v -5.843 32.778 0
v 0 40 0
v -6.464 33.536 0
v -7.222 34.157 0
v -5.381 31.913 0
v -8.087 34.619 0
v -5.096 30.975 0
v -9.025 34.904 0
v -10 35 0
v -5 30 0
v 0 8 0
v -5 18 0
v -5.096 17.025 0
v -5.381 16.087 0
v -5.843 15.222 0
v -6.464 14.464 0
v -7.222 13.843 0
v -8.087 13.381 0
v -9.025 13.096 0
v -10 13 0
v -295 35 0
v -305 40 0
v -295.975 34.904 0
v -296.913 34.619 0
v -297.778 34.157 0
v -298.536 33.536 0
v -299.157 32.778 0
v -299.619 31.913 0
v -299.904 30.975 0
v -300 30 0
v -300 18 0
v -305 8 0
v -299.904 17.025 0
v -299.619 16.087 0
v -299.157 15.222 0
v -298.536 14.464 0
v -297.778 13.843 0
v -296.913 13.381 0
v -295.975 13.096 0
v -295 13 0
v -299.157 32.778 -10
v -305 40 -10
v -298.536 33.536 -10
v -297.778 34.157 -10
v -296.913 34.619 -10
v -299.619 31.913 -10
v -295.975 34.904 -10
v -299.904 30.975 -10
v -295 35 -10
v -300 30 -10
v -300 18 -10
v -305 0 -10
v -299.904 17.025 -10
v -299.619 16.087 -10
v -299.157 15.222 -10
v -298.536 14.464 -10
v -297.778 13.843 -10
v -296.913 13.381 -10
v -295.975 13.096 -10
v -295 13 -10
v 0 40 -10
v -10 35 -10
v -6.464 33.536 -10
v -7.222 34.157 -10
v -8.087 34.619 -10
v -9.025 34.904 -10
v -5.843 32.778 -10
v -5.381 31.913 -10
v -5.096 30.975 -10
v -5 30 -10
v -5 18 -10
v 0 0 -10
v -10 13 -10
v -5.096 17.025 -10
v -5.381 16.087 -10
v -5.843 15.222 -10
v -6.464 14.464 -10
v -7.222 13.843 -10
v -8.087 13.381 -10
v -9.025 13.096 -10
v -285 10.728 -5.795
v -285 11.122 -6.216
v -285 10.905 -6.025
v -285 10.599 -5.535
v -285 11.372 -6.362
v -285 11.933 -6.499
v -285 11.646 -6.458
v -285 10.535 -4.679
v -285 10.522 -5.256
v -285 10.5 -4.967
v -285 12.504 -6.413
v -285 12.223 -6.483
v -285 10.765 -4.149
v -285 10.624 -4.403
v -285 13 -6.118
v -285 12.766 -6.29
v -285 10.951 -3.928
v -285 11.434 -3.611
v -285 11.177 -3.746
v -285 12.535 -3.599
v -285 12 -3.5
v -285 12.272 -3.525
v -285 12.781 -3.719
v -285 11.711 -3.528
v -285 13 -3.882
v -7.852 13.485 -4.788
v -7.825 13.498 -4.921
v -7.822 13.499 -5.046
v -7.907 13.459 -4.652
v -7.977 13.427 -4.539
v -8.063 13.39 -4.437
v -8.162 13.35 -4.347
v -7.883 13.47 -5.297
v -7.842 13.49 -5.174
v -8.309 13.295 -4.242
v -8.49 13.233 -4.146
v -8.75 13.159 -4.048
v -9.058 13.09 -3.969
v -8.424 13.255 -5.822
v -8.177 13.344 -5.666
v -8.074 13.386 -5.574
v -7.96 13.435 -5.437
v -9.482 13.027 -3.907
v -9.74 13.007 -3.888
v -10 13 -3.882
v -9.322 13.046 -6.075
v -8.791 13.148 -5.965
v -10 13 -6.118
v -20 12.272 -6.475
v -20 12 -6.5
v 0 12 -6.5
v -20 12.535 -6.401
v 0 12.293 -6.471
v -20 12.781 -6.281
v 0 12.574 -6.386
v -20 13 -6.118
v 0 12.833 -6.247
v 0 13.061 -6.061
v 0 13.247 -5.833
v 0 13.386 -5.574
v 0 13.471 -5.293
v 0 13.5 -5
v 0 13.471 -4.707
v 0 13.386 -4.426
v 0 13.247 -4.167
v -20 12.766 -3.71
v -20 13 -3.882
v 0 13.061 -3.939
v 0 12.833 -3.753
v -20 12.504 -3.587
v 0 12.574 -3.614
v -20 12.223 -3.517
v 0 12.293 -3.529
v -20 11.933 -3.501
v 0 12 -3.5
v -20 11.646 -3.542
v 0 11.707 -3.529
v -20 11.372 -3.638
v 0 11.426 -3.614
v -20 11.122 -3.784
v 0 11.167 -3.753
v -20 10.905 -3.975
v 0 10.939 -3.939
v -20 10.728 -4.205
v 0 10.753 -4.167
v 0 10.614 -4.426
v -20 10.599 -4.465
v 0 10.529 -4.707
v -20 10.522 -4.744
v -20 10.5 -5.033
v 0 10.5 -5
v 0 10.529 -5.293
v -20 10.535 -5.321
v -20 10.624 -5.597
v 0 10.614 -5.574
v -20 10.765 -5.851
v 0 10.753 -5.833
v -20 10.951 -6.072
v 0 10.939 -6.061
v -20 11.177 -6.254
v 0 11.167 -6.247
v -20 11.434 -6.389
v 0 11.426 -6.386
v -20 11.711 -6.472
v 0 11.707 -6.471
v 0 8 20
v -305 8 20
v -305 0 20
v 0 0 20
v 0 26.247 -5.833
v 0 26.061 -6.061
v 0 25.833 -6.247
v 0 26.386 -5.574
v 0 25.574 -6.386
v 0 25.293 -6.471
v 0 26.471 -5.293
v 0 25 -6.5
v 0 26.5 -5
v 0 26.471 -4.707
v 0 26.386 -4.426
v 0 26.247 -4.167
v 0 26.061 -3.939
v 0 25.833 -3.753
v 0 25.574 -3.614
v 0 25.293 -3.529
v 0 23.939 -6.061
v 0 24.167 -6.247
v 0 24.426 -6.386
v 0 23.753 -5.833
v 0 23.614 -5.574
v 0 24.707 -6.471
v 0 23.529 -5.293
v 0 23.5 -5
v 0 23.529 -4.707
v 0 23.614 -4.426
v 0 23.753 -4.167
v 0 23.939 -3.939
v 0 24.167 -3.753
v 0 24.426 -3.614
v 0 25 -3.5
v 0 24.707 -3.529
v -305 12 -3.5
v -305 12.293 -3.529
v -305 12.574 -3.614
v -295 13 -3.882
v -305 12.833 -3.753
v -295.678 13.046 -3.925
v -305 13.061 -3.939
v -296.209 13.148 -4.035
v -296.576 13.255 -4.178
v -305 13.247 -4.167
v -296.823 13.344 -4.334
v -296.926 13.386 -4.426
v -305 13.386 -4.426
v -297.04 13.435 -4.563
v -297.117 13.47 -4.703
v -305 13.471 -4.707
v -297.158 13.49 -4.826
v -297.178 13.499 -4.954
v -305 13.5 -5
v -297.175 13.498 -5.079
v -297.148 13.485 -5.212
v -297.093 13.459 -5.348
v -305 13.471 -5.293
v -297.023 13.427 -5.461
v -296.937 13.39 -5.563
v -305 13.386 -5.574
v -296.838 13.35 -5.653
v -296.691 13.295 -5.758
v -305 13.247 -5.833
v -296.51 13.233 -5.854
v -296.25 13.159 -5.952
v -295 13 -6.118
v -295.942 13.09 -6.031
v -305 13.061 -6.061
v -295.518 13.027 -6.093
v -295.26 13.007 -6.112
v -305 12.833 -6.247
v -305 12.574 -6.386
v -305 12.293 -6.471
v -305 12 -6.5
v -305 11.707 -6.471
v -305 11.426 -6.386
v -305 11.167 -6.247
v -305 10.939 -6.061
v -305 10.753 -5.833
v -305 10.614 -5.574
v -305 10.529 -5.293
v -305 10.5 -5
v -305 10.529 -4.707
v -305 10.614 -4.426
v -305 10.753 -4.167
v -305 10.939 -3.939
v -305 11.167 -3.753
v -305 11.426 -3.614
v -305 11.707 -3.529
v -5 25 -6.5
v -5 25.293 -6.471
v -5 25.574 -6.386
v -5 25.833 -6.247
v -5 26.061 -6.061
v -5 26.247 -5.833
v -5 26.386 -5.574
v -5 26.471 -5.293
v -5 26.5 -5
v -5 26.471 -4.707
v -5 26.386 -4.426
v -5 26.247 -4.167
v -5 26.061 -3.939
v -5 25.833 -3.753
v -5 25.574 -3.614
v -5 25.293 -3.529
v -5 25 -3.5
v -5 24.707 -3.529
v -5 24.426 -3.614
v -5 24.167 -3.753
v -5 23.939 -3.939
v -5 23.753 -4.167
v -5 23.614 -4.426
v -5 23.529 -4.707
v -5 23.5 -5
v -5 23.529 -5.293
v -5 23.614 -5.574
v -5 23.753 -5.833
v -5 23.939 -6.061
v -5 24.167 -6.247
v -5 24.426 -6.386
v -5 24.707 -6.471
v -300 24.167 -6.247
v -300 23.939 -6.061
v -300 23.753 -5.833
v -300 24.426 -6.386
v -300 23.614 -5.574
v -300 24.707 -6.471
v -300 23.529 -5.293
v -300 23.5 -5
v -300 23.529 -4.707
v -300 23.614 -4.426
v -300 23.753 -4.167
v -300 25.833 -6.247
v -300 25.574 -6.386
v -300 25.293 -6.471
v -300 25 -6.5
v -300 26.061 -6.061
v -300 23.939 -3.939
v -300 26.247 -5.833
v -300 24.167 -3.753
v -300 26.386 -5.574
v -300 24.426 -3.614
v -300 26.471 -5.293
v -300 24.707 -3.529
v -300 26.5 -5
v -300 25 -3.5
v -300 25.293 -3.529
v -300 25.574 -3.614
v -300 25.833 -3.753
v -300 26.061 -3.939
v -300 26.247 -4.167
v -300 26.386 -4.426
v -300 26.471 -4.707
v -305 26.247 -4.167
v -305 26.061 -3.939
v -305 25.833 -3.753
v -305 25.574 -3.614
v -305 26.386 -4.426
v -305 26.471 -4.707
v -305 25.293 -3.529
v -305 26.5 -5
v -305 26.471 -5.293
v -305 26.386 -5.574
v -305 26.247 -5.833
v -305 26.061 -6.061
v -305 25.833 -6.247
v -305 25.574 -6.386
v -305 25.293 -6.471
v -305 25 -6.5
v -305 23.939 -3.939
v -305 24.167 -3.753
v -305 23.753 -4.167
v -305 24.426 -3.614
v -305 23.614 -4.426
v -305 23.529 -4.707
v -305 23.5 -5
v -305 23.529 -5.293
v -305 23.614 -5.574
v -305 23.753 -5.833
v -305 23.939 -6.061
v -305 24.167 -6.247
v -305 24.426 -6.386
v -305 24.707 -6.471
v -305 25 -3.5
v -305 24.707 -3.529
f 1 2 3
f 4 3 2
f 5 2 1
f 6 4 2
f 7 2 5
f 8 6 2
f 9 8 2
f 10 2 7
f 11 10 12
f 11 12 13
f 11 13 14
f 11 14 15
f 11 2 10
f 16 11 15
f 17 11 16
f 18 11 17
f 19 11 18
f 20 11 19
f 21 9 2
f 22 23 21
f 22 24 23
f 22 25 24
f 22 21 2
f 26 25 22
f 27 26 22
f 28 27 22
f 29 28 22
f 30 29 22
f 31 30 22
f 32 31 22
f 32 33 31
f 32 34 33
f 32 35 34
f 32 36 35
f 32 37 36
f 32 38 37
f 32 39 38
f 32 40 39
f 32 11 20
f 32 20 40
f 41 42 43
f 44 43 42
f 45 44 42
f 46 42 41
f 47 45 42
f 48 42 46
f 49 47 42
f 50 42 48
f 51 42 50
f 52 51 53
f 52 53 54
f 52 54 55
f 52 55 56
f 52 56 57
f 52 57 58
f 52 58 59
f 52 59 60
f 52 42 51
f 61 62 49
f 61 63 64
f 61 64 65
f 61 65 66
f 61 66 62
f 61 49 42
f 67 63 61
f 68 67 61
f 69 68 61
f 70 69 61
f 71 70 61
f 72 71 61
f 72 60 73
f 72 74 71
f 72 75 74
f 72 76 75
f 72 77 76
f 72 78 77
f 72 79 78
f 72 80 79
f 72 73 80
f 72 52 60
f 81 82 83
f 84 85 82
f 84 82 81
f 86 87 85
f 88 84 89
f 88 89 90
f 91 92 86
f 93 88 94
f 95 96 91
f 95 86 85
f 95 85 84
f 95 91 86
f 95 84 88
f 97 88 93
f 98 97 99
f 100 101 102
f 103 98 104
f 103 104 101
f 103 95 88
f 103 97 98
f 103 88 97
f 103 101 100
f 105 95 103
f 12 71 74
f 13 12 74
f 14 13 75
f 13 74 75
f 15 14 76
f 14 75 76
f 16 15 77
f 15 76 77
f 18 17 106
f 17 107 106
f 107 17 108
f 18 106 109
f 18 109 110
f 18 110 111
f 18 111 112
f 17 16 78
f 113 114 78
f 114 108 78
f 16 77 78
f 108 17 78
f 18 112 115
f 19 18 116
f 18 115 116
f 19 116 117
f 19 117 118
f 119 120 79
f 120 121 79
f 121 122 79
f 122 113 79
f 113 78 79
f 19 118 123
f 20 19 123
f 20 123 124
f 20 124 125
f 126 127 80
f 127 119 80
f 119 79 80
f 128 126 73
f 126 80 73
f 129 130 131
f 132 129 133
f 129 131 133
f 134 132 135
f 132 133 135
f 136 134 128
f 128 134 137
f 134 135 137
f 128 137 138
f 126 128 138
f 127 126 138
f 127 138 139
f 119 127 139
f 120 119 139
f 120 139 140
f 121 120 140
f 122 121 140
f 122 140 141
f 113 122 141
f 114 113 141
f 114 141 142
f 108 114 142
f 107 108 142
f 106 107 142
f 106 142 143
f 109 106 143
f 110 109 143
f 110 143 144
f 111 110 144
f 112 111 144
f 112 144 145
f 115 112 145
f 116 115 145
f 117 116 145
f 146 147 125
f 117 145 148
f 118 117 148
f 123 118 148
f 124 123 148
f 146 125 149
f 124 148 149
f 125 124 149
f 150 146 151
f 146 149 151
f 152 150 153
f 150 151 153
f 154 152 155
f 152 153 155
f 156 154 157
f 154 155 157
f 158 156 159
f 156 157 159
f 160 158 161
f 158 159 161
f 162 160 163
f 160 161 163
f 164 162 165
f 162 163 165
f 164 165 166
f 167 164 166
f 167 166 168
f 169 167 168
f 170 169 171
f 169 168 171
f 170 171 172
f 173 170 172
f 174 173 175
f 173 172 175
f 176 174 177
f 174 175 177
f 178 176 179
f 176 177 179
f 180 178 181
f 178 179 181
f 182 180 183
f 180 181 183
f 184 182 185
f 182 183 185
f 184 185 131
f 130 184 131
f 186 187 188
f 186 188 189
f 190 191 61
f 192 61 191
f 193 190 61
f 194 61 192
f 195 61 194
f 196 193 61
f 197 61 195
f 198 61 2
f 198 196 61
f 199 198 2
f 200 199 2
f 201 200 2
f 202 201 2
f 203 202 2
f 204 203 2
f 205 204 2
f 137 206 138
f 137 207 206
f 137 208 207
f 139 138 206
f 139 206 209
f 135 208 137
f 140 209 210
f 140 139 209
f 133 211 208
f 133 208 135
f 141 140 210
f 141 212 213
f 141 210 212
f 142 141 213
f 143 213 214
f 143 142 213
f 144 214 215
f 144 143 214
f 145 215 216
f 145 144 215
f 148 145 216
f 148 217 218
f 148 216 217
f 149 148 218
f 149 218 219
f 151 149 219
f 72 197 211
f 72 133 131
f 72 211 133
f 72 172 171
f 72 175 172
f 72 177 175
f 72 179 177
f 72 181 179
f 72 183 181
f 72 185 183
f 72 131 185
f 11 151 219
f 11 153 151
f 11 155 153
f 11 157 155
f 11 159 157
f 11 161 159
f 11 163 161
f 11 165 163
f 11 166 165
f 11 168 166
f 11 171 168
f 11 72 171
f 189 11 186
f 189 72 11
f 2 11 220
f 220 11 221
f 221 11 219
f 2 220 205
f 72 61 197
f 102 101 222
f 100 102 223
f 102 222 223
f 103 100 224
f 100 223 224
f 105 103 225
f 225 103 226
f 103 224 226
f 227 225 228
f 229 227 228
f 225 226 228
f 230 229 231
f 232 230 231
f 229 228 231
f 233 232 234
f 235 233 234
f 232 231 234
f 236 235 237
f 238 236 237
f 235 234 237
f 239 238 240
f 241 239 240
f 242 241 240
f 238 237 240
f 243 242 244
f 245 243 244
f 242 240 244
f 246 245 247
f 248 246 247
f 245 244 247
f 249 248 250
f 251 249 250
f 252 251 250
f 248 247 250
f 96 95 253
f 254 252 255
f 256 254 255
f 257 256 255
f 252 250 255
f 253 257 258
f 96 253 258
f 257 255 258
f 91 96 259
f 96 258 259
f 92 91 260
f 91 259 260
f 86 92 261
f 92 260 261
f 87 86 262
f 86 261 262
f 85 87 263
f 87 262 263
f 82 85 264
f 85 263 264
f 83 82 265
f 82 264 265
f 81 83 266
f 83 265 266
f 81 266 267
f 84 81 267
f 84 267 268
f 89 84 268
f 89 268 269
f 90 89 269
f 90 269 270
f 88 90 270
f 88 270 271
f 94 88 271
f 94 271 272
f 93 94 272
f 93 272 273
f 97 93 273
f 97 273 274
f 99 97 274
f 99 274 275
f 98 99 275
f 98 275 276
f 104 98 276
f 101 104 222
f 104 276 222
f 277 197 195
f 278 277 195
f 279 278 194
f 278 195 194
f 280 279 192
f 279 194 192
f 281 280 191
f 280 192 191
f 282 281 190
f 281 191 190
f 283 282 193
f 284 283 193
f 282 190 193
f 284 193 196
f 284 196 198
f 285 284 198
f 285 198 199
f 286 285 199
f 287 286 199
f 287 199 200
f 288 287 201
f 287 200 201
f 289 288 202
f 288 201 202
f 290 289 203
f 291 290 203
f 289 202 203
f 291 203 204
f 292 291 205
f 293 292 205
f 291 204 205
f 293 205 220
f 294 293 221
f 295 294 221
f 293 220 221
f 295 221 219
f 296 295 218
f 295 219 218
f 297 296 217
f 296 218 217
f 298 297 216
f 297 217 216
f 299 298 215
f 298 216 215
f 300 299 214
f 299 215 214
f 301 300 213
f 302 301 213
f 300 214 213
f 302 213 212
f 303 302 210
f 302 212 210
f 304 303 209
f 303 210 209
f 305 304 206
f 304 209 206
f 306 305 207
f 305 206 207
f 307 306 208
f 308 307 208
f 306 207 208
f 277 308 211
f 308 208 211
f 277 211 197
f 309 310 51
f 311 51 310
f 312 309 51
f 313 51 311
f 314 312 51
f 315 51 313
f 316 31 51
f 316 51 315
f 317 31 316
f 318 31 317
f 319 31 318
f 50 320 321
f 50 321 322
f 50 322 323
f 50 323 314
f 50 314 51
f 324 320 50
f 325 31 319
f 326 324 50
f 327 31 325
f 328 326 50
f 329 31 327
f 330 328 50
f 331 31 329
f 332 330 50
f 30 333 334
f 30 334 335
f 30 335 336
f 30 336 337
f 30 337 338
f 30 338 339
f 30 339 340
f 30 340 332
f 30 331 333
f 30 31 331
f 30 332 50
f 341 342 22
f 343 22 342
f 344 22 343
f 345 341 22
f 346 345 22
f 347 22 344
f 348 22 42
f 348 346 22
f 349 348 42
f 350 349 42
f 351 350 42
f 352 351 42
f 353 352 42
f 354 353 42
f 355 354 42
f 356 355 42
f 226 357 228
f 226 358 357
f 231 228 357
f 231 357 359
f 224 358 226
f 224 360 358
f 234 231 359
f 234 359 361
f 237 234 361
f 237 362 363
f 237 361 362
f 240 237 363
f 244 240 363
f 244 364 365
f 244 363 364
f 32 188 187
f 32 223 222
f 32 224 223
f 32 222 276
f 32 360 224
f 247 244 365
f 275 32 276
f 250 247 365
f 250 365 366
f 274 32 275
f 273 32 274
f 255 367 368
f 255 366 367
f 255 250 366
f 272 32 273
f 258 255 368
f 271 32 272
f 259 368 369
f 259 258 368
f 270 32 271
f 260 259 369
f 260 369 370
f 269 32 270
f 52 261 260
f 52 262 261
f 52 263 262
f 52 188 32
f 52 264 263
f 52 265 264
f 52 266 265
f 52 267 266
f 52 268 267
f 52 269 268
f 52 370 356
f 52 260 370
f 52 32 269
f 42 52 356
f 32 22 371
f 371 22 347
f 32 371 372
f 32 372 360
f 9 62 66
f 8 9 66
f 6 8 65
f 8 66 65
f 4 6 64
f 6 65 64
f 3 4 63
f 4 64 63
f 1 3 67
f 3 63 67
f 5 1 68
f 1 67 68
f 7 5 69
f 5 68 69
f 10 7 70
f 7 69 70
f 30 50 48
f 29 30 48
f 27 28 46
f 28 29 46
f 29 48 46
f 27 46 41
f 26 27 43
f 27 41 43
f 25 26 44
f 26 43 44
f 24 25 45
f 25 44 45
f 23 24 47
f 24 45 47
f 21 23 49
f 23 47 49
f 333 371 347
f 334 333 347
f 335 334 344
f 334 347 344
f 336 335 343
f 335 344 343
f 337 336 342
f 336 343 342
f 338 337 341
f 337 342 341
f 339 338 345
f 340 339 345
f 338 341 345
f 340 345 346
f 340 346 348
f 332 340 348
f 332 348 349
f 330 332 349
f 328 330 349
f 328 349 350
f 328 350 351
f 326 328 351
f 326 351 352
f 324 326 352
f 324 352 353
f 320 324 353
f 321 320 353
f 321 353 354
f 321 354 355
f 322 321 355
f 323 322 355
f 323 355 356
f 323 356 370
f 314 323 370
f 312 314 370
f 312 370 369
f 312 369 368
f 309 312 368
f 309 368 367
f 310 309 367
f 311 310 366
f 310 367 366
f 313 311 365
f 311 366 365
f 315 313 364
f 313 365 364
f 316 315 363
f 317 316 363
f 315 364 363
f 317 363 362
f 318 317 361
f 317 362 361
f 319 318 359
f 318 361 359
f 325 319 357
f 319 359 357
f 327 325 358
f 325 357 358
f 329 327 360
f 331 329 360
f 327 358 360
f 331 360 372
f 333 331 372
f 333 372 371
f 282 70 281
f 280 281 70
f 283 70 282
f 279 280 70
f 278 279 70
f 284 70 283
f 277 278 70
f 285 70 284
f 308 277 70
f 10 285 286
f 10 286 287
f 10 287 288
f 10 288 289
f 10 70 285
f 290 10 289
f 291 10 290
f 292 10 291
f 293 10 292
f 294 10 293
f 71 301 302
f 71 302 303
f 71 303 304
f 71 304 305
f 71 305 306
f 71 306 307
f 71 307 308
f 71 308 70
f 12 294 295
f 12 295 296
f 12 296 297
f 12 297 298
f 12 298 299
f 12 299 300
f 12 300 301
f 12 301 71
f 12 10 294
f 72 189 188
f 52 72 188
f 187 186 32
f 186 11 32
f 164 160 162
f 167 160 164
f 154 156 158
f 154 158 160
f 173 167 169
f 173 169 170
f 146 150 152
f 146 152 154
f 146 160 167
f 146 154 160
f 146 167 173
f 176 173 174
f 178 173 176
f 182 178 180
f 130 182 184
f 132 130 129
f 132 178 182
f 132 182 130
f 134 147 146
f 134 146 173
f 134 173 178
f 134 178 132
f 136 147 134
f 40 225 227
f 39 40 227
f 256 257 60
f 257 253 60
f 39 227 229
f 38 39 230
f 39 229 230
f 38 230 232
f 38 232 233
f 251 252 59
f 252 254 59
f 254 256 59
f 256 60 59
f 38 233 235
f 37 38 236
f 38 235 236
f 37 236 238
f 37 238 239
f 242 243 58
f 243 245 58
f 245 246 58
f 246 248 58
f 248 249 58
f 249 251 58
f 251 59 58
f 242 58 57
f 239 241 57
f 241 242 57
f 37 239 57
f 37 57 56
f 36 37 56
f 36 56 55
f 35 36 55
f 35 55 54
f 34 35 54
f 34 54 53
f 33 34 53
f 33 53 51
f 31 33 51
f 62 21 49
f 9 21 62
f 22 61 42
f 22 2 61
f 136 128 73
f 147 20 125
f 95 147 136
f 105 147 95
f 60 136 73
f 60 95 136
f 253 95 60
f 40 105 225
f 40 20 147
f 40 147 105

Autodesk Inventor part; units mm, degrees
ref_plane "YZ Plane" through (0, 0, 0) normal (1, 0, 0) x (0, 1, 0)
ref_plane "XZ Plane" through (0, 0, 0) normal (0, 1, 0) x (-1, 0, 0)
ref_plane "XY Plane" through (0, 0, 0) normal (0, 0, 1) x (1, 0, 0)
sketch "Sketch1" plane through (0, 0, 0) normal (0, 1, 0) x (-1, 0, 0)
  line L0 (0, 0) -> (305, 0)
  line L1 (305, 0) -> (305, -10)
  line L2 (305, -10) -> (0, -10)
  line L3 (0, -10) -> (0, 0)
  dimension "d0" = 305
  dimension "d1" = 10
extrude "Extrusion1" add sketch "Sketch1" along normal blind 40
sketch "Sketch2" plane through (-305, 0, 0) normal (0, 0, 1) x (1, 0, 0)
  line L0 (305, 0) -> (0, 0) projected
  line L1 (305, 0) -> (305, 40) projected
  line L2 (0, 0) -> (305, 0)
  line L3 (305, 0) -> (305, 8)
  line L4 (305, 8) -> (0, 8)
  line L5 (0, 8) -> (0, 0)
  dimension "d4" = 8
extrude "Extrusion2" add sketch "Sketch2" along normal blind 20
sketch "Sketch3" plane through (-305, 40, 0) normal (0, 0, 1) x (1, 0, 0)
  line L0 (305, -27) -> (0, -27) projected
  line L1 (5, -5) -> (300, -5)
  line L2 (300, -5) -> (300, -27)
  line L3 (300, -27) -> (5, -27)
  line L4 (5, -27) -> (5, -5)
  line L5 (0, -32) -> (0, 0) projected
  line L6 (0, 0) -> (305, 0) projected
  line L7 (305, -32) -> (305, 0) projected
  point P0 (305, -40)
  point P1 (305, -16)
  dimension "d8" = 5
  dimension "d9" = 5
  dimension "d10" = 5
extrude "Extrusion3" cut sketch "Sketch3" against normal blind 20 contours L0 L4 L1 L2
fillet "Fillet2" radius 5 4 edges at (-300, 13, -5) (-300, 35, -5) (-5, 13, -5) (-5, 35, -5)
sketch "Sketch4" plane through (-305, 0, -10) normal (-1, 0, 0) x (0, 0, 1)
  circle A0 centre (5, 25) radius 1.5
  circle A1 centre (5, 12) radius 1.5
  line L0 (0, 40) -> (10, 40) projected
  line L1 (0, 0) -> (0, 40) projected
  point P0 (10, 0)
  dimension "d14" = 3
  dimension "d15" = 3
  dimension "d16" = 15
  dimension "d17" = 10
  dimension "d18" = 5
  dimension "d19" = 5
extrude "Extrusion4" cut sketch "Sketch4" against normal blind 20
sketch "Sketch5" plane through (0, 0, -10) normal (1, 0, 0) x (0, 0, -1)
  circle A0 centre (-5, 25) radius 1.5
  circle A1 centre (-5, 12) radius 1.5
  line L0 (0, 0) -> (0, 40) projected
  line L1 (-10, 40) -> (0, 40) projected
  point P0 (-10, 0)
  dimension "d22" = 3
  dimension "d23" = 3
  dimension "d24" = 5
  dimension "d25" = 5
  dimension "d26" = 10
  dimension "d27" = 15
extrude "Extrusion5" cut sketch "Sketch5" against normal blind 20
thread "Thread1" size "M3x0.5" class "6H" standard "ANSI Metric M Profile" full length
thread "Thread2" size "M3x0.5" class "6H" standard "ANSI Metric M Profile" full length
thread "Thread3" size "M3x0.5" class "6H" standard "ANSI Metric M Profile" full length
thread "Thread4" size "M3x0.5" class "6H" standard "ANSI Metric M Profile" full length
properties part number "chessboard-base-2"
